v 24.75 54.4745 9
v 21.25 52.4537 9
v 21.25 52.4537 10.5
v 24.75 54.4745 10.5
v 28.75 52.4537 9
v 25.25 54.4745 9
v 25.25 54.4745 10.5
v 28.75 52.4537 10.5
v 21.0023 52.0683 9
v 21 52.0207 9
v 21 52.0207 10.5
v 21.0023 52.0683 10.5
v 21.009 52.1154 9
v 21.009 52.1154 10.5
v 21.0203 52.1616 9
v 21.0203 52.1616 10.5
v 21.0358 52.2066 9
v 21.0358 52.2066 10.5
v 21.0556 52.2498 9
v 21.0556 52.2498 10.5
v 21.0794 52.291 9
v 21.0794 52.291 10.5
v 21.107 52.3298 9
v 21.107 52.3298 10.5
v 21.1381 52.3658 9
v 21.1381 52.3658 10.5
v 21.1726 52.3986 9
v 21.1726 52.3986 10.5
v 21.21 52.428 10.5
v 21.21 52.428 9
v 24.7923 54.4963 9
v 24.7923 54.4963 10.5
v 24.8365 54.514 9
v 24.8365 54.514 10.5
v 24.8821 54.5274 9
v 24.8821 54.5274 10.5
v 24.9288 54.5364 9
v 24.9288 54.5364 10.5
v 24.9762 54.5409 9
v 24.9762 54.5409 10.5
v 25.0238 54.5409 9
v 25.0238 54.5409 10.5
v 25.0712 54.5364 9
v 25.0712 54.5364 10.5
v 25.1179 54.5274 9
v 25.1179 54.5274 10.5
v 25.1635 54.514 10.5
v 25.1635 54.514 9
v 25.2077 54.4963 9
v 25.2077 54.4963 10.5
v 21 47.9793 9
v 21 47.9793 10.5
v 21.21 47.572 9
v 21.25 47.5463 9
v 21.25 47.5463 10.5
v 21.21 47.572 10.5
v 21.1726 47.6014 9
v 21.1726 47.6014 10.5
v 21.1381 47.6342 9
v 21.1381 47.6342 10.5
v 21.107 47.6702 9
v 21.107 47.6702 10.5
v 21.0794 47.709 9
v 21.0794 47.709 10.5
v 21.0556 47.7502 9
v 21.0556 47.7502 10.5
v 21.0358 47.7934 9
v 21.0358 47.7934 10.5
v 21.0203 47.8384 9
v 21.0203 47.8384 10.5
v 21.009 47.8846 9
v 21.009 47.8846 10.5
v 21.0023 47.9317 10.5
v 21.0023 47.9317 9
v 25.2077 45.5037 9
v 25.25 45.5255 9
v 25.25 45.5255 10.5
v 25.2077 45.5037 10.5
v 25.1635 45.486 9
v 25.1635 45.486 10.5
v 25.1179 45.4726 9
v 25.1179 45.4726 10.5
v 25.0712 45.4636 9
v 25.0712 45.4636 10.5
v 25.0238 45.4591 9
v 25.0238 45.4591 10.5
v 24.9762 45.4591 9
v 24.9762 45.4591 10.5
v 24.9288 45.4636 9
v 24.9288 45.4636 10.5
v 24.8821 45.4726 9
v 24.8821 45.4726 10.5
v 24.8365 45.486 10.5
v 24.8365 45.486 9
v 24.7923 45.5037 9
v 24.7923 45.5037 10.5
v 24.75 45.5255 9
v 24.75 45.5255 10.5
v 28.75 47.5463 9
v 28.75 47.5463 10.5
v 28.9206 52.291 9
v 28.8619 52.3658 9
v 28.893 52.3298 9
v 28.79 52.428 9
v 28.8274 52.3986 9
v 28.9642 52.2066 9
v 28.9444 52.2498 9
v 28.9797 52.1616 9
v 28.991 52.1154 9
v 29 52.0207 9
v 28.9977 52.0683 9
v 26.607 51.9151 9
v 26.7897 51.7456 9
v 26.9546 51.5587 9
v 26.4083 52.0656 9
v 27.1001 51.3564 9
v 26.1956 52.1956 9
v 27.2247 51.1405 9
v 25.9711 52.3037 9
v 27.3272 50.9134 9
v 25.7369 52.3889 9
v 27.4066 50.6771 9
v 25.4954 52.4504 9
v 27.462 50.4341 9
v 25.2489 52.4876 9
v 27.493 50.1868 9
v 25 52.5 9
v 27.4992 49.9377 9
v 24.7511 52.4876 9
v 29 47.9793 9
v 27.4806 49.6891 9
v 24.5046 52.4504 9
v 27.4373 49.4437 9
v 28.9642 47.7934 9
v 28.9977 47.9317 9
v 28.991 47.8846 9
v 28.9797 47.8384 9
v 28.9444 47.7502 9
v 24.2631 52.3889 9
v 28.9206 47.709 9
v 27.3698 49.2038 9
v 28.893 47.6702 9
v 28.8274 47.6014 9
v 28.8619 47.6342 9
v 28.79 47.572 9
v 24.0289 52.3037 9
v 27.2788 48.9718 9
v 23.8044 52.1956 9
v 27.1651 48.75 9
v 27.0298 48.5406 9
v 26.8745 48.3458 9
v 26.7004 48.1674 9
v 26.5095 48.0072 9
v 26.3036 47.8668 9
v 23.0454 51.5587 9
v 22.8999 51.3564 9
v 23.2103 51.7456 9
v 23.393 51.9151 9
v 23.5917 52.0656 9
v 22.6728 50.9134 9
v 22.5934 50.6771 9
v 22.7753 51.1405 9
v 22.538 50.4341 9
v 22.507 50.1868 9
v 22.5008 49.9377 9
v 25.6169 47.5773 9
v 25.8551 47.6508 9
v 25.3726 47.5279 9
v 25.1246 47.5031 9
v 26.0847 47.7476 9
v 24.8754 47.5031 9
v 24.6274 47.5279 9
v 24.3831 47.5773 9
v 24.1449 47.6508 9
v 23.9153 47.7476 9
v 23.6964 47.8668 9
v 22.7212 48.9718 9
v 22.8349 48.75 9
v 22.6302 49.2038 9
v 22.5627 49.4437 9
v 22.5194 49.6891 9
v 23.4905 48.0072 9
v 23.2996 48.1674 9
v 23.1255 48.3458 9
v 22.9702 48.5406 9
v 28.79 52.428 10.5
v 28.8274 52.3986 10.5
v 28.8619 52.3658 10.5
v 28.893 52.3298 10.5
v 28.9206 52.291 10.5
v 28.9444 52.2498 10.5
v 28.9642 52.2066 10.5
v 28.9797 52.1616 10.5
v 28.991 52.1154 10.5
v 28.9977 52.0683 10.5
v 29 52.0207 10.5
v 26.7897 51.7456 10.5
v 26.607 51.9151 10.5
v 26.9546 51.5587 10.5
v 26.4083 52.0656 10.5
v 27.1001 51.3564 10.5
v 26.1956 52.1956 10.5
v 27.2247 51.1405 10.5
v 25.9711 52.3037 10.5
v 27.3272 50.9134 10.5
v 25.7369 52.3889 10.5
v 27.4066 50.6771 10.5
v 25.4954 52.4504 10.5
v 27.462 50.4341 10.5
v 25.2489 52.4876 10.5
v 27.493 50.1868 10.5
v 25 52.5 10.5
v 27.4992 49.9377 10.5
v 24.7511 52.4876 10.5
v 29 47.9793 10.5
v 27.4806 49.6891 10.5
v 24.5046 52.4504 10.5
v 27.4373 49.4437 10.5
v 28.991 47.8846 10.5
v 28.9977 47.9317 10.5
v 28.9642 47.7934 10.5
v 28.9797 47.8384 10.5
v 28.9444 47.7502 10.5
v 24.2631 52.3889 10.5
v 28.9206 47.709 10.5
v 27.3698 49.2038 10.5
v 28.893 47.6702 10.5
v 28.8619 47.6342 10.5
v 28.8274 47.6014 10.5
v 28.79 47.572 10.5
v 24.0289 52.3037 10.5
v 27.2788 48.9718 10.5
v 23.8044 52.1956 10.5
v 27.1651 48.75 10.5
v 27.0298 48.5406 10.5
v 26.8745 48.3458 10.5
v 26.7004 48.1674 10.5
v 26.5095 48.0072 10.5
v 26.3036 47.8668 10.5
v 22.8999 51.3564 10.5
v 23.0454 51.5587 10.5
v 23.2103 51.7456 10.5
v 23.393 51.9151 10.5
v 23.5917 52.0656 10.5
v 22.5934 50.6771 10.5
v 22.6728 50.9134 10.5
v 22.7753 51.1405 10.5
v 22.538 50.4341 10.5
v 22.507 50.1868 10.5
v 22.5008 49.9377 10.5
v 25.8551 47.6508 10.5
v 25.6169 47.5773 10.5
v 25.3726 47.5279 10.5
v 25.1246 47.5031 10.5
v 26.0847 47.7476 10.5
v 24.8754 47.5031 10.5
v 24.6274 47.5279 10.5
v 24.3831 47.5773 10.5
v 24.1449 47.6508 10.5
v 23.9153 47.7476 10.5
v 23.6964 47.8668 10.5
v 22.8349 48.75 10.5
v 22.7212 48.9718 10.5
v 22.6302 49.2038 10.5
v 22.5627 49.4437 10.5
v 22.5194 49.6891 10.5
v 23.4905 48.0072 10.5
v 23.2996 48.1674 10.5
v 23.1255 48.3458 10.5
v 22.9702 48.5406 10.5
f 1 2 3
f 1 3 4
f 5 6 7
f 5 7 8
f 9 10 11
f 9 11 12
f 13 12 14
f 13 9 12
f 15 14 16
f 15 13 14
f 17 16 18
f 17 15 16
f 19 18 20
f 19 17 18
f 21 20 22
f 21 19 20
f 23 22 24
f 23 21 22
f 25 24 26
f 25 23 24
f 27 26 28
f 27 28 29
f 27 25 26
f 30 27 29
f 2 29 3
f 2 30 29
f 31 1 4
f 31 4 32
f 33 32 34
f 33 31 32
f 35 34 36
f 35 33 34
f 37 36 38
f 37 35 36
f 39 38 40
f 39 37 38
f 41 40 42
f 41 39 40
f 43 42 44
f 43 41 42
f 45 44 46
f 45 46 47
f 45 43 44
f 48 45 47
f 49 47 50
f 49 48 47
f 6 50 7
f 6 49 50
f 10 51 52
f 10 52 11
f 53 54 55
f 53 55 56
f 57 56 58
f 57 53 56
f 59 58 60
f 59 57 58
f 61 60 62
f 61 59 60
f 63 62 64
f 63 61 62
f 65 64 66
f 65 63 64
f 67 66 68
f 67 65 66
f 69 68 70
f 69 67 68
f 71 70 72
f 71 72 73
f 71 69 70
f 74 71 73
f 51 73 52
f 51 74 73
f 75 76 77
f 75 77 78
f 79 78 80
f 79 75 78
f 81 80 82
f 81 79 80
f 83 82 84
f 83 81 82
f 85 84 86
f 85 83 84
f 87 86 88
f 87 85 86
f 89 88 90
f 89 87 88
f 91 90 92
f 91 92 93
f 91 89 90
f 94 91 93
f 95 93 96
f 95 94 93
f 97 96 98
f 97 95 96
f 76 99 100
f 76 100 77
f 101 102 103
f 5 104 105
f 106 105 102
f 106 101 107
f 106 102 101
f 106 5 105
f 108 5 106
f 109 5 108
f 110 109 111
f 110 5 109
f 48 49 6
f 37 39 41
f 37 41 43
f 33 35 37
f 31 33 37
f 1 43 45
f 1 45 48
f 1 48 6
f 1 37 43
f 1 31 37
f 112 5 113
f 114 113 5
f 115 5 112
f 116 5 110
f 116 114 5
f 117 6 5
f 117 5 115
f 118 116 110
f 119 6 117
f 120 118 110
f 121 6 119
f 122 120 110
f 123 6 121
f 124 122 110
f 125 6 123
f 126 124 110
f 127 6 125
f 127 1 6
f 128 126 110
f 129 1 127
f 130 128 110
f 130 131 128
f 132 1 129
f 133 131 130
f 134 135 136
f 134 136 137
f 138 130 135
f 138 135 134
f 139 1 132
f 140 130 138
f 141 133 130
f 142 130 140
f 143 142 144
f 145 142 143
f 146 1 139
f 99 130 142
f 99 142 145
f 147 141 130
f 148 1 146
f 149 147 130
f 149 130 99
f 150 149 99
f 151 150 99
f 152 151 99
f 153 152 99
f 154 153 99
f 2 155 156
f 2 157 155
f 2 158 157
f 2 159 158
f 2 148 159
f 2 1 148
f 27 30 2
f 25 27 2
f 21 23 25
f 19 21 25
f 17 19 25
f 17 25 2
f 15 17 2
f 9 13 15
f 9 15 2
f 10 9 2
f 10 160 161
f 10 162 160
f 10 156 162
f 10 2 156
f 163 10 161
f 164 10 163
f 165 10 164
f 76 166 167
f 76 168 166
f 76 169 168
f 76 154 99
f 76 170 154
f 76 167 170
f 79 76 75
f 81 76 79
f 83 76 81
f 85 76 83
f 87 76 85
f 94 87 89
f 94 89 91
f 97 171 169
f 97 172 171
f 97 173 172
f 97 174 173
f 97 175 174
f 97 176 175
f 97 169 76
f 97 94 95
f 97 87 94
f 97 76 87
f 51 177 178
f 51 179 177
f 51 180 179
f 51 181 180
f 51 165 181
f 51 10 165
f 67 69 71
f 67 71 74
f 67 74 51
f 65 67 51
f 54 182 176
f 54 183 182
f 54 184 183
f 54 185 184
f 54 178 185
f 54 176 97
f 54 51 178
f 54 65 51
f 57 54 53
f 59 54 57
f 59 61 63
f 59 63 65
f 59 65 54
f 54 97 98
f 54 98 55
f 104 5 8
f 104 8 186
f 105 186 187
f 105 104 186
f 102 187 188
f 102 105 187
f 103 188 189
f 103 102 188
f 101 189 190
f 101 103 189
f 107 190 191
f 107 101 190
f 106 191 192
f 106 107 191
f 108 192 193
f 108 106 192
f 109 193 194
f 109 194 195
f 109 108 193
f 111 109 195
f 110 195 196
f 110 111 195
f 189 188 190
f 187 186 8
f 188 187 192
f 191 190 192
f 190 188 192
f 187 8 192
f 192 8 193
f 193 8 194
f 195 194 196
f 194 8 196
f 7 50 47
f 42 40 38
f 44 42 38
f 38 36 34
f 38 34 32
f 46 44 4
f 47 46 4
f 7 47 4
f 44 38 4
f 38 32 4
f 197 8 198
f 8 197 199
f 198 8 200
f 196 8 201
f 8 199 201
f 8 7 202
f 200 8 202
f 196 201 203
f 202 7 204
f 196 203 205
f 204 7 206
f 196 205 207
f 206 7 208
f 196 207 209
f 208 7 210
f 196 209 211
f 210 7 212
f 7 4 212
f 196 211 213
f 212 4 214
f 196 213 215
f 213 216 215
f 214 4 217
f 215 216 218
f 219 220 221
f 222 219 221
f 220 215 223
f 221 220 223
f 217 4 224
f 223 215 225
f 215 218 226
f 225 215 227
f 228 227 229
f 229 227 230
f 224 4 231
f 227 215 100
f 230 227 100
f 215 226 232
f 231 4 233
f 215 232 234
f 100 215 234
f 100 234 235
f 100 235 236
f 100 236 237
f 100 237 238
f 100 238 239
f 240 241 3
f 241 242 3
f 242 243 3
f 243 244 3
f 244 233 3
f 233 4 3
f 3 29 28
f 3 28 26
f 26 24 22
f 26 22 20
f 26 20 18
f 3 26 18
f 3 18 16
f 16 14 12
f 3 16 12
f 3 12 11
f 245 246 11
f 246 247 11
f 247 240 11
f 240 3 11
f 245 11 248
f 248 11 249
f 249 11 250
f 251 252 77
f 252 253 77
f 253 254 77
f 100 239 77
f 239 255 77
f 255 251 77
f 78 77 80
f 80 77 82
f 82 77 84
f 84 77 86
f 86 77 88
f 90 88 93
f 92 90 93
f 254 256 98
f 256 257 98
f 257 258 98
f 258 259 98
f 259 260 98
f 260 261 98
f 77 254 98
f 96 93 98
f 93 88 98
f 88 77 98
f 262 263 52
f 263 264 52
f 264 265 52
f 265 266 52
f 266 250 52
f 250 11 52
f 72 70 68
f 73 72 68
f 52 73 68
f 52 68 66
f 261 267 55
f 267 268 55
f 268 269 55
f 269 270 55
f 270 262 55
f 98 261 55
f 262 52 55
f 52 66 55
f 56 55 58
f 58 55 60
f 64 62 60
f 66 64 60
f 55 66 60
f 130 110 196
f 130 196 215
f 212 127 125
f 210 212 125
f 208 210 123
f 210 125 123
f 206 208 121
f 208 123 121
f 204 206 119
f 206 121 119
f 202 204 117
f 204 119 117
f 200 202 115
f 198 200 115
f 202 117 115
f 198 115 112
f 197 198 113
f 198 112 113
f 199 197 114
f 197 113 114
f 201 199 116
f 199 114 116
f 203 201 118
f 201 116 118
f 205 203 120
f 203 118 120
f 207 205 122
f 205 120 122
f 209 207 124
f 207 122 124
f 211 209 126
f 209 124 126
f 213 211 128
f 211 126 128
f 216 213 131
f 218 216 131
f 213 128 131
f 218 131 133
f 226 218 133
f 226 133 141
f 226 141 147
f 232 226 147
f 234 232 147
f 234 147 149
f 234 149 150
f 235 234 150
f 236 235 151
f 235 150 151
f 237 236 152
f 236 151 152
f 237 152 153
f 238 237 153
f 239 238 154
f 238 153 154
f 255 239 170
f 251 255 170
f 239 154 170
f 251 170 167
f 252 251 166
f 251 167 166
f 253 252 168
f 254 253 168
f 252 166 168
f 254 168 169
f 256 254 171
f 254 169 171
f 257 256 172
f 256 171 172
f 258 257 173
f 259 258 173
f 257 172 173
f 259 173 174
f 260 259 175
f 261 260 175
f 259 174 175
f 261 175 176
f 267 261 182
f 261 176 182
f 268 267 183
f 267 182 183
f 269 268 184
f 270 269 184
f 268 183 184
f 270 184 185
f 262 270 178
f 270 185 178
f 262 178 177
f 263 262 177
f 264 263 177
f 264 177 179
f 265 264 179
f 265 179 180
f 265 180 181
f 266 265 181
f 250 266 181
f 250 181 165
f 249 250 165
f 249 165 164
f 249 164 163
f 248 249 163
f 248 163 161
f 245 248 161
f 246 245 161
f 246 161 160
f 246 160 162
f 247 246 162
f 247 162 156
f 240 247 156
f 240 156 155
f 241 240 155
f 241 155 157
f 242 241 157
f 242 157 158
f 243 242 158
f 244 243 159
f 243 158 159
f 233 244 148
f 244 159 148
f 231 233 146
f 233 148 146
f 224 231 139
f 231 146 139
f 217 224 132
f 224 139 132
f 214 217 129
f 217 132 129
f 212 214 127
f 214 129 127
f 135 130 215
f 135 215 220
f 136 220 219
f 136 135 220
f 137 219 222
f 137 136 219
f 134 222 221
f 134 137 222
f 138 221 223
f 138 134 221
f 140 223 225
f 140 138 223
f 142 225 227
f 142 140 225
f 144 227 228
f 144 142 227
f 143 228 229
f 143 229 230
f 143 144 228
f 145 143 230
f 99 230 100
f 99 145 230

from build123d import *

# Parameters (mm, degrees)
CIRCLE001_R            = 2.5
EXTRUDE009_DEPTH       = 1.5
EXTRUDE010_DEPTH       = 1.5
CUT001_PLACEMENT_ANGLE = 90


with BuildPart() as extrude009:
    # Circle001 → Extrude009 (new body)
    with BuildSketch(Plane(origin=(10, 0, 0), x_dir=(1, 0, 0), z_dir=(0, 0, -1))):
        Circle(CIRCLE001_R)
    extrude(amount=-EXTRUDE009_DEPTH)


with BuildPart() as ecrou:
    # Polygon001 → Extrude010 (new body)
    with BuildSketch(Plane(origin=(10, 0, 0), x_dir=(1, 0, 0), z_dir=(0, 0, 1))):
        with BuildLine():
            Line((2.453739, 3.75), (4.474465, 0.25))
            ThreePointArc((4.474465, 0.25), (4.541452, 0), (4.474465, -0.25))
            Line((4.474465, -0.25), (2.453739, -3.75))
            ThreePointArc((2.453739, -3.75), (2.270726, -3.933013), (2.020726, -4))
            Line((2.020726, -4), (-2.020726, -4))
            ThreePointArc((-2.020726, -4), (-2.270726, -3.933013), (-2.453739, -3.75))
            Line((-2.453739, -3.75), (-4.474465, -0.25))
            ThreePointArc((-4.474465, -0.25), (-4.541452, 0), (-4.474465, 0.25))
            Line((-4.474465, 0.25), (-2.453739, 3.75))
            ThreePointArc((-2.453739, 3.75), (-2.270726, 3.933013), (-2.020726, 4))
            Line((-2.020726, 4), (2.020726, 4))
            ThreePointArc((2.020726, 4), (2.270726, 3.933013), (2.453739, 3.75))
        make_face()
    extrude(amount=EXTRUDE010_DEPTH)

    # Cut001: cut Extrude009
    add(extrude009.part, mode=Mode.SUBTRACT)


with BuildPart() as ecrou_1:
    # Cut001 placement: moved
    add(ecrou.part.moved(Location((25, 40, 9))).rotate(Axis((25, 40, 9), (0, 0, 1)), CUT001_PLACEMENT_ANGLE))


solid = ecrou_1.part
